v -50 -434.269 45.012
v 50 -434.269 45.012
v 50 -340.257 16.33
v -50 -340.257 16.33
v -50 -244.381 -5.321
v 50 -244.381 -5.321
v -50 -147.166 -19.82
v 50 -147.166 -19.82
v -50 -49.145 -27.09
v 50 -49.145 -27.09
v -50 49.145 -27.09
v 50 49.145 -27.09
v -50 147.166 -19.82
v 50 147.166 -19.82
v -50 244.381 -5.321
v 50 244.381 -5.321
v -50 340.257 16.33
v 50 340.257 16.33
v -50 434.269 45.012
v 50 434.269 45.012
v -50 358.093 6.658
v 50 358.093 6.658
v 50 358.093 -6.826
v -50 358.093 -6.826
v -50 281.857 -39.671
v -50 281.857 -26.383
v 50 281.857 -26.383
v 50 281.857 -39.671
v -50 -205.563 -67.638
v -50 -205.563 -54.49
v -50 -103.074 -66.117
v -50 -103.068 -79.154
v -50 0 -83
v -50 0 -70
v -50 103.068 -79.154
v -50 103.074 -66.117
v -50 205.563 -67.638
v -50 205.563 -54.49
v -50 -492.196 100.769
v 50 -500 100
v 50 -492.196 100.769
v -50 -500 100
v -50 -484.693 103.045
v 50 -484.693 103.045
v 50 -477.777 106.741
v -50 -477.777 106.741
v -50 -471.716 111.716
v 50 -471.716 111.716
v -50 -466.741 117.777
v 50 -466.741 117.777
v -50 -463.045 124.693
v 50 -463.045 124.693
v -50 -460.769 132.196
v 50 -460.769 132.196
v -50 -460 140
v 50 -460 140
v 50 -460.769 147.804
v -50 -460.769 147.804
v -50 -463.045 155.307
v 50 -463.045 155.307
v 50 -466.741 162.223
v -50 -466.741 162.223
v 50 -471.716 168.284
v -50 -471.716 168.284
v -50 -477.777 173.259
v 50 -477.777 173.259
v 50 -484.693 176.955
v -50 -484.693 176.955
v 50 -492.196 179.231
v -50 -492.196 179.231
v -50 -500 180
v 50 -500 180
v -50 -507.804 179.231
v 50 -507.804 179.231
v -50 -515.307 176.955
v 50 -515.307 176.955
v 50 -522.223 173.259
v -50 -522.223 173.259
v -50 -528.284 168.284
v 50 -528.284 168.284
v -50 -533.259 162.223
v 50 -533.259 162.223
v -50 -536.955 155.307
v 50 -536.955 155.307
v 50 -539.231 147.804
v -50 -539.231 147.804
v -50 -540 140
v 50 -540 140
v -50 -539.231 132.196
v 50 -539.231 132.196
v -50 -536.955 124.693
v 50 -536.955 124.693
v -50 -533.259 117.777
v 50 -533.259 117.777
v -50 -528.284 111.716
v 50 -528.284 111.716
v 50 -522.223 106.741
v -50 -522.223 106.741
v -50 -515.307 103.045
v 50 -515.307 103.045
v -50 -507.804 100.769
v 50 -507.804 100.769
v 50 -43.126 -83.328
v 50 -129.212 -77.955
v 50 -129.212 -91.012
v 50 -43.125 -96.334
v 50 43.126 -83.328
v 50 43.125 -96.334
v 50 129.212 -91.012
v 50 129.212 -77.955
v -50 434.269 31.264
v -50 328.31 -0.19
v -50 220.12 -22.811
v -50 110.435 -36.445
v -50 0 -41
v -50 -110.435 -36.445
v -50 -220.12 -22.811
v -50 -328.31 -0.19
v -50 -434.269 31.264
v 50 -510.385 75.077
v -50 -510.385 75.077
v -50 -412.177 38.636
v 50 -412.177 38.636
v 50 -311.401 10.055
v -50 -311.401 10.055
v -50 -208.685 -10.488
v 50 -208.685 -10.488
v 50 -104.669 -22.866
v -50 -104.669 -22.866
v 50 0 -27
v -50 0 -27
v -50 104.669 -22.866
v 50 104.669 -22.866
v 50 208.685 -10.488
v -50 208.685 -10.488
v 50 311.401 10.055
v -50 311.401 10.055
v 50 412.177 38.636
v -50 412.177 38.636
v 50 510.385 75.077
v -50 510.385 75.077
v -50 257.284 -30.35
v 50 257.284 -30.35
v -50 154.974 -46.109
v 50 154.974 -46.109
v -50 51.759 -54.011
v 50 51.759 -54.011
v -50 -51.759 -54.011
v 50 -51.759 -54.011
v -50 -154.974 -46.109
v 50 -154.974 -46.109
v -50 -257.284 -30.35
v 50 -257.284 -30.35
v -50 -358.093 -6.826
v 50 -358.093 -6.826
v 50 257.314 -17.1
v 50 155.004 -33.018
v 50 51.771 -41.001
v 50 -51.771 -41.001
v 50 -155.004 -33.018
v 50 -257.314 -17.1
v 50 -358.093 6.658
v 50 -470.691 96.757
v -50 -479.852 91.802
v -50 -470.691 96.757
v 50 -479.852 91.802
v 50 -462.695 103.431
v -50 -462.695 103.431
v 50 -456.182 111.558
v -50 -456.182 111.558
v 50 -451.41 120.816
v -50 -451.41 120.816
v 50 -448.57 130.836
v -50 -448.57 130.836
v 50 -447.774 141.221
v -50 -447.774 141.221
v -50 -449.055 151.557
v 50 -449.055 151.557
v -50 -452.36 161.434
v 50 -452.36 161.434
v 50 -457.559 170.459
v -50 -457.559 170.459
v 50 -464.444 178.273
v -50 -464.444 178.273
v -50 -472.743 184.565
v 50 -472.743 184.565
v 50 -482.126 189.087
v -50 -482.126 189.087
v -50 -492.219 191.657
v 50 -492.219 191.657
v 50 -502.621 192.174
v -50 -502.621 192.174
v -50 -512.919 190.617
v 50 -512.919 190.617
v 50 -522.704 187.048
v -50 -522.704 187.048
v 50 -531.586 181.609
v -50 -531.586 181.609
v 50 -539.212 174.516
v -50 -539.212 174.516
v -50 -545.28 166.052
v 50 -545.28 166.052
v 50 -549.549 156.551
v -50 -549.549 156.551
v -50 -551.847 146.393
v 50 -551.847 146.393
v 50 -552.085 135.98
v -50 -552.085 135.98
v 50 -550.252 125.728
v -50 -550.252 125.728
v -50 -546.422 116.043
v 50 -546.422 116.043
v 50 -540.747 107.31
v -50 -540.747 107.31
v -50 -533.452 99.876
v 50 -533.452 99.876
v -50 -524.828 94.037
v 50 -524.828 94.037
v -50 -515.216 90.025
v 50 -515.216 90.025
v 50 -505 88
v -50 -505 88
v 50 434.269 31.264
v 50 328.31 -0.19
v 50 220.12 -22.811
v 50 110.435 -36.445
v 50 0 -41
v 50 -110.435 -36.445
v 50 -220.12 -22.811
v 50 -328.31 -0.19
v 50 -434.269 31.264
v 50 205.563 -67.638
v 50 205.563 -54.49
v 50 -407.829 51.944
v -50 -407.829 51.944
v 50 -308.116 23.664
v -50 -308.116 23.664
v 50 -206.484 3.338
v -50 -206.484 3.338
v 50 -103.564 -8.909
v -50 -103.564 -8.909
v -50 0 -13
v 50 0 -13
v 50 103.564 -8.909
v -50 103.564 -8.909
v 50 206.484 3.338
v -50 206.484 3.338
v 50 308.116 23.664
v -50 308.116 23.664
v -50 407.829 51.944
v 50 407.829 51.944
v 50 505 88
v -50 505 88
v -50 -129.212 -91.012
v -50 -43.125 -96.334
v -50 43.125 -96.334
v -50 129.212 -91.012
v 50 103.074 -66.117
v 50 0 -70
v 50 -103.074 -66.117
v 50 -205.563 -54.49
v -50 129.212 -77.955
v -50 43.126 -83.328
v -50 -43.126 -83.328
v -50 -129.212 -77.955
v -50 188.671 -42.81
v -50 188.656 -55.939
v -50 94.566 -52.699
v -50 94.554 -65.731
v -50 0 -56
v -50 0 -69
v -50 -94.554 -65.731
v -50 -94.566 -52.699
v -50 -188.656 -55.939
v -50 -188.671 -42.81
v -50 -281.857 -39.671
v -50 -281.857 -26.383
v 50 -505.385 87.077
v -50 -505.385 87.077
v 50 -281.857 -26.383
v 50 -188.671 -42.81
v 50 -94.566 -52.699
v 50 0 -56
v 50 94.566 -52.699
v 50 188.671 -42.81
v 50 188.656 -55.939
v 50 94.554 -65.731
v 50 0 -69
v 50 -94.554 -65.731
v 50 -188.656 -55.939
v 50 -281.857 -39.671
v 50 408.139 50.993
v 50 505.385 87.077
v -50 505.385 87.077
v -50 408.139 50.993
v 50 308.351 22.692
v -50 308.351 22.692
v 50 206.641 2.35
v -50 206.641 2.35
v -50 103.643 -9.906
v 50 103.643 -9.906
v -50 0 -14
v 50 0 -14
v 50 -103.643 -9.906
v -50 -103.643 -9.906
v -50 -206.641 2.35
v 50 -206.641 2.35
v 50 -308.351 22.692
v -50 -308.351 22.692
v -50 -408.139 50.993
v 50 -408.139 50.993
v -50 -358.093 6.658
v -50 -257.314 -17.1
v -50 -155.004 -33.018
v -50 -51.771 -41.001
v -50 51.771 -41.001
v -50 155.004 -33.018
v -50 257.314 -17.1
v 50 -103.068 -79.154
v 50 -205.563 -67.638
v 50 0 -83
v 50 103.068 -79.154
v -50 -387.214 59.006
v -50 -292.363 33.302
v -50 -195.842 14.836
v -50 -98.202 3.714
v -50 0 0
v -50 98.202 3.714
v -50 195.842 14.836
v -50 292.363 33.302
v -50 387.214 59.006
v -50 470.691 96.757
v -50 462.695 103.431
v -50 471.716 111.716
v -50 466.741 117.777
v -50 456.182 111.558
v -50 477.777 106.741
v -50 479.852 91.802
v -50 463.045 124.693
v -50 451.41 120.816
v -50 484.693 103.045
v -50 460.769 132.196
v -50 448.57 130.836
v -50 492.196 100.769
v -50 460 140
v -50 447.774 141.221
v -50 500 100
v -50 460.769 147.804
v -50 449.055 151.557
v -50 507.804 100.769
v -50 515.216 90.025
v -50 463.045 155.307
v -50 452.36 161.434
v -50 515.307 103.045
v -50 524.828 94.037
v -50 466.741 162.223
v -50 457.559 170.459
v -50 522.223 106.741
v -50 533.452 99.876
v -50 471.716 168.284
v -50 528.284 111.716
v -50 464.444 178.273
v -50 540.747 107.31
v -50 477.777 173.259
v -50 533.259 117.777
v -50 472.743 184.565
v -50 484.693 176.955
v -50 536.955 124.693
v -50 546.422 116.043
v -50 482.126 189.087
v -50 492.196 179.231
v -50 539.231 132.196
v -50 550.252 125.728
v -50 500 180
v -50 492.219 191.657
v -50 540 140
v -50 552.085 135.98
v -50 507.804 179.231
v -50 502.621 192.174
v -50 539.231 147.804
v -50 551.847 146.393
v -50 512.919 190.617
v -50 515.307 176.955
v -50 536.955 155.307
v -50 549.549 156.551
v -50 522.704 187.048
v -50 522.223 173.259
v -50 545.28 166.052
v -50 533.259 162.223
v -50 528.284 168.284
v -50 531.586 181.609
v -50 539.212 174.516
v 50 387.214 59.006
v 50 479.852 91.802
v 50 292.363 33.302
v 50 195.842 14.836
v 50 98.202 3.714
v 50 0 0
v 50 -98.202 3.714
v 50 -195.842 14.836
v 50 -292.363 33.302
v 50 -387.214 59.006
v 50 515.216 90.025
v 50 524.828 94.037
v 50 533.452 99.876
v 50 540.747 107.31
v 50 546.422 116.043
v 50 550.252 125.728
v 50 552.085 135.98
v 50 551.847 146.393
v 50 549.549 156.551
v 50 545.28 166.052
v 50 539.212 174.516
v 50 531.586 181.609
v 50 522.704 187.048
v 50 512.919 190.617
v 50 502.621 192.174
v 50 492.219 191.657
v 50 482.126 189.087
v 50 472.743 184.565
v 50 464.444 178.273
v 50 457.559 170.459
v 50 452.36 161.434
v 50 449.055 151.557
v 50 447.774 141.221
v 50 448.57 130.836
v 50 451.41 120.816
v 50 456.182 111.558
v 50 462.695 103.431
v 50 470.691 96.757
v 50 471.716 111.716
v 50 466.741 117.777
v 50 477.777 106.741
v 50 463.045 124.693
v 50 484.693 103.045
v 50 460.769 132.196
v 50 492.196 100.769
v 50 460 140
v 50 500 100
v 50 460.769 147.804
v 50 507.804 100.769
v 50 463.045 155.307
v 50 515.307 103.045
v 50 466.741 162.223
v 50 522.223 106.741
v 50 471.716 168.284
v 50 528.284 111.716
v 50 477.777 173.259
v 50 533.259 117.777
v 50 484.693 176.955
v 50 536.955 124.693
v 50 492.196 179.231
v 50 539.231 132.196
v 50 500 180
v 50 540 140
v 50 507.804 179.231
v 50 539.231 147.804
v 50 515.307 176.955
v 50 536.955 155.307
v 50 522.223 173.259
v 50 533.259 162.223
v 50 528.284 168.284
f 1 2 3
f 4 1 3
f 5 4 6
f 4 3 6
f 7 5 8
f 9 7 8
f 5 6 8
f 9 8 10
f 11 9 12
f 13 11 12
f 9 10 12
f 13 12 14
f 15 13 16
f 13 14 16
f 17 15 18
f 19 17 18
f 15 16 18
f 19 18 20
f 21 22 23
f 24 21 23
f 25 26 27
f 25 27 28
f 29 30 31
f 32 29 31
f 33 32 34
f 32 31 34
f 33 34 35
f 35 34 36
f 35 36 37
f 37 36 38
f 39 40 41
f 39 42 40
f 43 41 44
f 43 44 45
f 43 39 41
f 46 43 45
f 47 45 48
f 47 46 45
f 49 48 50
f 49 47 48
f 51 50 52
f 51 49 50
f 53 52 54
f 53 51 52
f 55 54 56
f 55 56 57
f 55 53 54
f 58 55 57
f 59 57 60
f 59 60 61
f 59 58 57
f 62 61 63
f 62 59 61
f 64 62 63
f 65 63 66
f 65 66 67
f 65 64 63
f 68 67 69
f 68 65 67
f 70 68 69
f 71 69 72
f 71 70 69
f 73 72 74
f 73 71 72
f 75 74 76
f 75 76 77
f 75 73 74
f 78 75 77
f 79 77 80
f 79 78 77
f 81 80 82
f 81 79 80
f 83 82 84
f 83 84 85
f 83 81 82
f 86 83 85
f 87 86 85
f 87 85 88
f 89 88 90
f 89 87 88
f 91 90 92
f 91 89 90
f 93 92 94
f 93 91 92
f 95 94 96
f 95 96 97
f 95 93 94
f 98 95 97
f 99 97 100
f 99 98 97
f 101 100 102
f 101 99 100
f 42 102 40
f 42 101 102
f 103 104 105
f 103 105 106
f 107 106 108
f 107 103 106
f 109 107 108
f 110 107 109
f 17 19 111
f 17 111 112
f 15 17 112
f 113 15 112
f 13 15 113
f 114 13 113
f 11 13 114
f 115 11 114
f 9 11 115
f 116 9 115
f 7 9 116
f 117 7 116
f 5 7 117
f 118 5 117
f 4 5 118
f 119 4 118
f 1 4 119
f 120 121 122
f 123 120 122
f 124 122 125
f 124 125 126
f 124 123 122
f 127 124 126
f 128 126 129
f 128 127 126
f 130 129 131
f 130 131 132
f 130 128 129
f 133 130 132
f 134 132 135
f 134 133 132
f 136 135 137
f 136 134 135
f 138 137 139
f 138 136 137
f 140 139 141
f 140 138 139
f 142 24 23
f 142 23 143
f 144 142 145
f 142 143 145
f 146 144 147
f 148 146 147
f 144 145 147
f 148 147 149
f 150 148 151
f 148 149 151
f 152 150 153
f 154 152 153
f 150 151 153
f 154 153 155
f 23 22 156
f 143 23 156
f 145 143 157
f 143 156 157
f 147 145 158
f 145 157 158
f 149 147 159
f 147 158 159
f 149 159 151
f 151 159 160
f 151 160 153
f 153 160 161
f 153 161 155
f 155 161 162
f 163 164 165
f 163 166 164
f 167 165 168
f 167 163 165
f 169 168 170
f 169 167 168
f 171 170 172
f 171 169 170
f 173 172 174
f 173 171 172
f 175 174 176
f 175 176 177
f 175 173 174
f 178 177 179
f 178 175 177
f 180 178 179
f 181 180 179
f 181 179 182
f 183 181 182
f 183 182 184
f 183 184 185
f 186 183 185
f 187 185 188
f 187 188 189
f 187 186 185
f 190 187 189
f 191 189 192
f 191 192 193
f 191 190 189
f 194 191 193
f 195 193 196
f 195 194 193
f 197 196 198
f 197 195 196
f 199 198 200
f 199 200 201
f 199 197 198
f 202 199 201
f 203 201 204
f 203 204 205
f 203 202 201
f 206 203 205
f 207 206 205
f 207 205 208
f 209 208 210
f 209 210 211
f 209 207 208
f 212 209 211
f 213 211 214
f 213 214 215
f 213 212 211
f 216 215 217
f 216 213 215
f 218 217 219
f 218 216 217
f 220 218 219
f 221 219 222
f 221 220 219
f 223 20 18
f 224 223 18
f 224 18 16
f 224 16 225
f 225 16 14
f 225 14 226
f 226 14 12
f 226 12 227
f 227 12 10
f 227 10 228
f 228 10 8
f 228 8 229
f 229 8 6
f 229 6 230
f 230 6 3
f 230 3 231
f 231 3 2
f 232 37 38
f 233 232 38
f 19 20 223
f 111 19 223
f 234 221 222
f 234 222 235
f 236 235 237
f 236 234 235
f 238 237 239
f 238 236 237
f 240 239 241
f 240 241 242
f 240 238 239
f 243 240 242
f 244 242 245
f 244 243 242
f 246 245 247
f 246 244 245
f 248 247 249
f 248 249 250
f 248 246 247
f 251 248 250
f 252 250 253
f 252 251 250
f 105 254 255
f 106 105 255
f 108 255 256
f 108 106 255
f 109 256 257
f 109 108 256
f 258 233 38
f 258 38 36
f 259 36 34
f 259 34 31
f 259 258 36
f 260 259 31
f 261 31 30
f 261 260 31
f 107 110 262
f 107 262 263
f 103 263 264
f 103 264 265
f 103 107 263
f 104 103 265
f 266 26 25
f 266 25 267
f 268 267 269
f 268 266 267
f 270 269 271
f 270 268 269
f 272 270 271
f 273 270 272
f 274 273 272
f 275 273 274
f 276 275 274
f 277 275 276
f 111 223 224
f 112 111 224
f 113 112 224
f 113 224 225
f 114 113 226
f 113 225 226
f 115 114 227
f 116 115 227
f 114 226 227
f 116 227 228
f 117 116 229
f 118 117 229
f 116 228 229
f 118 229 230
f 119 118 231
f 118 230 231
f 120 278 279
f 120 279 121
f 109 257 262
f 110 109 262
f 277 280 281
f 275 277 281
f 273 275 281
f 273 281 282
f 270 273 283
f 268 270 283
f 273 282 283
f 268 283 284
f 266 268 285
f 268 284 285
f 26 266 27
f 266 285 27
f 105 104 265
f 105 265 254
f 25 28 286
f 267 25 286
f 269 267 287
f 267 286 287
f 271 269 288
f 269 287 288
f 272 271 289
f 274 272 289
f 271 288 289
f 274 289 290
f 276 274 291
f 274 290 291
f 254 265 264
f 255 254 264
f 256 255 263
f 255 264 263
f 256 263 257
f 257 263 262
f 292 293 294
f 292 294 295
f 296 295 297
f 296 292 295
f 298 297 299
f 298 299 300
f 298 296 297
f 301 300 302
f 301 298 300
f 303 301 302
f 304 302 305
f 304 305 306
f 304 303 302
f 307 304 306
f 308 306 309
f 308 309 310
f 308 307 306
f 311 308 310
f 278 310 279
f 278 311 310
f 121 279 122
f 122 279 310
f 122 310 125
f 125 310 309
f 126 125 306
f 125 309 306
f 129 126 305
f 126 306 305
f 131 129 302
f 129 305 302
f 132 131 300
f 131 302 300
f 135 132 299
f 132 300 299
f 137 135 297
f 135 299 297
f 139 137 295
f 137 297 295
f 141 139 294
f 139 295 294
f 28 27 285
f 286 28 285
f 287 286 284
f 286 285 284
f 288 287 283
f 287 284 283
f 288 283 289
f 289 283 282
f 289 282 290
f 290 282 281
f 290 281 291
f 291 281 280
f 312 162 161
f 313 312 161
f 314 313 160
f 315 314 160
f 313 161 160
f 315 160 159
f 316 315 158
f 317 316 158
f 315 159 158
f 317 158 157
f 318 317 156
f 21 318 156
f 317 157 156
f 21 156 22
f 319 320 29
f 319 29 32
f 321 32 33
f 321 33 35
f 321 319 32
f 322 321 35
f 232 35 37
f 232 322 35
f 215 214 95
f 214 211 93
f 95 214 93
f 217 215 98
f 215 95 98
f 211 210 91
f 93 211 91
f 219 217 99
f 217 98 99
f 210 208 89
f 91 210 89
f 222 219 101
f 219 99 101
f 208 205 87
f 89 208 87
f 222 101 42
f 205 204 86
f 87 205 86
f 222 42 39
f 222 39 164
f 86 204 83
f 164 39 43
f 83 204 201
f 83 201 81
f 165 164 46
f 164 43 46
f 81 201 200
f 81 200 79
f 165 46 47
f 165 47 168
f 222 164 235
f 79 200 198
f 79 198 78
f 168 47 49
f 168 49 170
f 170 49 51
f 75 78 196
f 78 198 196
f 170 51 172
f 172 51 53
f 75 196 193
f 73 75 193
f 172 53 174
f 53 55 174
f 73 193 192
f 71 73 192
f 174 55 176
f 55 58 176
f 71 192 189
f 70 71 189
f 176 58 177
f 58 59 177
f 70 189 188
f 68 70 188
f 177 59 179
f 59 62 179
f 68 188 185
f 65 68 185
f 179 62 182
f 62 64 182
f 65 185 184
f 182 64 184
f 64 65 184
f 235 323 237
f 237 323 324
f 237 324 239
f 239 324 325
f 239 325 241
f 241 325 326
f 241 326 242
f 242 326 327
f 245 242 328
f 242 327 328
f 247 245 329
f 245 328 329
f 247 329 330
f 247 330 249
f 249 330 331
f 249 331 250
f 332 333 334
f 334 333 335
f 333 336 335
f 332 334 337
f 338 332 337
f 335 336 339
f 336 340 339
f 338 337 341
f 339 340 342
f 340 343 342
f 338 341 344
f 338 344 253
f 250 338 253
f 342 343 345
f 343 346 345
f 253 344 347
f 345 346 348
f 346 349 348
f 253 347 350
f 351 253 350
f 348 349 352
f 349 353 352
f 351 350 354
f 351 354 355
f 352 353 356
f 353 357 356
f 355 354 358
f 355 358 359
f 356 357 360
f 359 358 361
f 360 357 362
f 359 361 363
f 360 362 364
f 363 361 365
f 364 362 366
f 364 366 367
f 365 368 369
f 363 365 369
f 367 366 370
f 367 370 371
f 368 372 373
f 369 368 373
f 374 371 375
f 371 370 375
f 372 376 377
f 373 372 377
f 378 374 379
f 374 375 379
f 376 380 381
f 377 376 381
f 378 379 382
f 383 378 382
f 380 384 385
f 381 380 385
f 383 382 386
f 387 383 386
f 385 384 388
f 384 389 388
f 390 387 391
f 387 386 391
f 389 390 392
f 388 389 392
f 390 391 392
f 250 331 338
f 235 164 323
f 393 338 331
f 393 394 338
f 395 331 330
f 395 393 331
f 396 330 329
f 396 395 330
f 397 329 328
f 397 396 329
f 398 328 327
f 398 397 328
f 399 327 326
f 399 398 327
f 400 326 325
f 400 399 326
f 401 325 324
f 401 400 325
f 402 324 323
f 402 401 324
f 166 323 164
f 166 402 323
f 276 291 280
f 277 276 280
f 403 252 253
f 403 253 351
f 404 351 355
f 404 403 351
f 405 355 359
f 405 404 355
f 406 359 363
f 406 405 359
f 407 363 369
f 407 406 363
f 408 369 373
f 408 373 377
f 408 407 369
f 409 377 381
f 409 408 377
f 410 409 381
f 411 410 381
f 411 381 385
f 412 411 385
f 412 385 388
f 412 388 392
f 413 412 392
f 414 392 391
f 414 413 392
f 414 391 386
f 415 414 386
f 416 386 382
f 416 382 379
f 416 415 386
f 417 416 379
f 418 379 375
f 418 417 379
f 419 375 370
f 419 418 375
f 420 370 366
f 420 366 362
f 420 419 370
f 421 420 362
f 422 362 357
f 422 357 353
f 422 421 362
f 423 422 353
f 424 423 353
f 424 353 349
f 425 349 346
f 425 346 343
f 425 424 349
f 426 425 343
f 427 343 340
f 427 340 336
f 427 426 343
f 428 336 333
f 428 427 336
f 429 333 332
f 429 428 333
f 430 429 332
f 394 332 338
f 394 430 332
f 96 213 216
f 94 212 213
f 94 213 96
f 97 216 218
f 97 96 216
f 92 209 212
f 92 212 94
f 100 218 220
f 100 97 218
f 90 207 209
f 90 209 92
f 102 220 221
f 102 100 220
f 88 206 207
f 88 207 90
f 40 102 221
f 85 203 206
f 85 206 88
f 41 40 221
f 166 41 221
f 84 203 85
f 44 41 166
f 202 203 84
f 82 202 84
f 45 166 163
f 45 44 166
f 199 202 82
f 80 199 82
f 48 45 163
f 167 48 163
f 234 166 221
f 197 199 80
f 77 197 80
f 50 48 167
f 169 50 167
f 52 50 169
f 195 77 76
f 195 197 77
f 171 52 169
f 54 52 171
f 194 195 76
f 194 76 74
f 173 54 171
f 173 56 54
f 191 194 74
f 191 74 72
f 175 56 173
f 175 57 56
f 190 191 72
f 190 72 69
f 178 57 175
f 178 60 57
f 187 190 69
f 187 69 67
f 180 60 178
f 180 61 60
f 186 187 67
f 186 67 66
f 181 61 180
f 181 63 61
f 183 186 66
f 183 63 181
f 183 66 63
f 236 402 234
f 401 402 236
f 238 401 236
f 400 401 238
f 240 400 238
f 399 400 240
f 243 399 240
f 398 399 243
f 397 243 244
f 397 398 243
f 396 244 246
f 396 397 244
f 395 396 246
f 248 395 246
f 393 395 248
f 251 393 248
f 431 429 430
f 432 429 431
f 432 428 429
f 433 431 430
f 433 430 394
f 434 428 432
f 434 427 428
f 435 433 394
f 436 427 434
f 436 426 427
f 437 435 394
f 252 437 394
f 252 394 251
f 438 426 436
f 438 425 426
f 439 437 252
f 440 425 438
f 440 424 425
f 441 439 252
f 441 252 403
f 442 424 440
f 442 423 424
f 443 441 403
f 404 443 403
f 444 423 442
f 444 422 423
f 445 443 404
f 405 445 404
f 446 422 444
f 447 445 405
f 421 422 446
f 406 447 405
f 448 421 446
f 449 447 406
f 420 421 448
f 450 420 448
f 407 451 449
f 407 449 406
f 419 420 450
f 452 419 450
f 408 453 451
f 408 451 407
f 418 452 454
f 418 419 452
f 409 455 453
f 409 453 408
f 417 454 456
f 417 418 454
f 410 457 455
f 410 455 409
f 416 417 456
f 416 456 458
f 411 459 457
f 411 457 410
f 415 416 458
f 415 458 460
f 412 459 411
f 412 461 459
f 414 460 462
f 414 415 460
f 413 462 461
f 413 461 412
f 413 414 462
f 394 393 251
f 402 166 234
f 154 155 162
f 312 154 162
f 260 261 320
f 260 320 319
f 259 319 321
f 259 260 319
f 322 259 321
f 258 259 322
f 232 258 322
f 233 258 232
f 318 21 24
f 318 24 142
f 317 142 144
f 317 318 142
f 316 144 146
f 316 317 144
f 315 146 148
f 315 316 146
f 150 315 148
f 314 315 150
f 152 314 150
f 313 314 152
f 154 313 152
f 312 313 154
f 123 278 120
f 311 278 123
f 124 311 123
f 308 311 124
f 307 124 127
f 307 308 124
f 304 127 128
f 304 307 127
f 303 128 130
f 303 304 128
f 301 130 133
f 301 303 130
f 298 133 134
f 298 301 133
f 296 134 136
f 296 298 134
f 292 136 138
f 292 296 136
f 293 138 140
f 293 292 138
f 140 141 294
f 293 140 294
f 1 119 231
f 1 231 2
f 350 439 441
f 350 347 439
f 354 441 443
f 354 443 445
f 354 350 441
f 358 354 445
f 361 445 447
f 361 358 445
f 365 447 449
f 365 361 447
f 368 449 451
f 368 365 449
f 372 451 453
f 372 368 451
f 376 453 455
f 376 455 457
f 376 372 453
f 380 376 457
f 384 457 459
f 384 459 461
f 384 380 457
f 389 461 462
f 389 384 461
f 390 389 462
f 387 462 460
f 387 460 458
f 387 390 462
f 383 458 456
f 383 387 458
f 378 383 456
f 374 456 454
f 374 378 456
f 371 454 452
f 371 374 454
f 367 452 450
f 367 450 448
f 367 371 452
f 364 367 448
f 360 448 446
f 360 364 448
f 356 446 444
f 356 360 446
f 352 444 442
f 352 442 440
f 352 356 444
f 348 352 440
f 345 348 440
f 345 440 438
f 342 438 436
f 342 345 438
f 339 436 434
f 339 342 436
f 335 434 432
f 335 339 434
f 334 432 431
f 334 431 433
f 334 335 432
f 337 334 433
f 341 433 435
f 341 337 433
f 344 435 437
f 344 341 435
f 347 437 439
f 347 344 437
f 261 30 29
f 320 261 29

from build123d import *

# Parameters (mm, degrees)
SKETCH1_R           = 40
BOSS_EXTRUDE1_DEPTH = 50
BOSS_EXTRUDE2_DEPTH = 100
BOSS_EXTRUDE3_DEPTH = 100
BOSS_EXTRUDE4_DEPTH = 100
BOSS_EXTRUDE5_DEPTH = 100
BOSS_EXTRUDE6_DEPTH = 100
BOSS_EXTRUDE7_DEPTH = 100


with BuildPart() as part:
    # Sketch1 → Boss-Extrude1 (new, symmetric)
    with BuildSketch(Plane.YZ):
        with BuildLine():
            ThreePointArc((-479.851684164, 91.802019036), (-507.809078393, 191.652863373), (-505, 88))
            ThreePointArc((-505, 88), (0, -13), (505, 88))
            ThreePointArc((505, 88), (507.809078393, 191.652863373), (479.851684164, 91.802019036))
            ThreePointArc((479.851684164, 91.802019036), (0, 0), (-479.851684164, 91.802019036))
        make_face()
        with Locations(Location((-500, 140, 0), (0, 0, 270))):
            Circle(SKETCH1_R, mode=Mode.SUBTRACT)
        with Locations(Location((500, 140, 0), (0, 0, 270))):
            Circle(SKETCH1_R, mode=Mode.SUBTRACT)
    extrude(amount=BOSS_EXTRUDE1_DEPTH, both=True)


with BuildPart() as body_2:
    # Sketch2 → Boss-Extrude2 (new body)
    with BuildSketch(Plane.YZ.offset(50)):
        with BuildLine():
            Line((-505.384615385, 87.076923077), (-510.384615385, 75.076923077))
            ThreePointArc((-510.384615385, 75.076923077), (0, -27), (510.384615385, 75.076923077))
            Line((510.384615385, 75.076923077), (505.384615385, 87.076923077))
            ThreePointArc((505.384615385, 87.076923077), (0, -14), (-505.384615385, 87.076923077))
        make_face()
    extrude(amount=-BOSS_EXTRUDE2_DEPTH)


with BuildPart() as body_3:
    # Sketch3 → Boss-Extrude3 (new body)
    with BuildSketch(Plane.YZ.offset(50)):
        with BuildLine():
            Line((434.269230769, 45.012256949), (434.269230769, 31.263922162))
            ThreePointArc((434.269230769, 31.263922162), (0, -41), (-434.269230769, 31.263922162))
            Line((-434.269230769, 31.263922162), (-434.269230769, 45.012256949))
            ThreePointArc((-434.269230769, 45.012256949), (0, -28), (434.269230769, 45.012256949))
        make_face()
    extrude(amount=-BOSS_EXTRUDE3_DEPTH)


with BuildPart() as body_4:
    # Sketch4 → Boss-Extrude4 (new body)
    with BuildSketch(Plane.YZ.offset(50)):
        with BuildLine():
            Line((-358.093070613, -6.826060644), (-358.093070613, 6.658068112))
            ThreePointArc((-358.093070613, 6.658068112), (0, -42), (358.093070613, 6.658068112))
            Line((358.093070613, 6.658068112), (358.093070613, -6.826060644))
            ThreePointArc((358.093070613, -6.826060644), (0, -55), (-358.093070613, -6.826060644))
        make_face()
    extrude(amount=-BOSS_EXTRUDE4_DEPTH)


with BuildPart() as body_5:
    # Sketch5 → Boss-Extrude5 (new body)
    with BuildSketch(Plane.YZ.offset(50)):
        with BuildLine():
            Line((-281.857345942, -39.6706448), (-281.857345942, -26.383216321))
            ThreePointArc((-281.857345942, -26.383216321), (0, -56), (281.857345942, -26.383216321))
            Line((281.857345942, -26.383216321), (281.857345942, -39.6706448))
            ThreePointArc((281.857345942, -39.6706448), (0, -69), (-281.857345942, -39.6706448))
        make_face()
    extrude(amount=-BOSS_EXTRUDE5_DEPTH)


with BuildPart() as body_6:
    # Sketch6 → Boss-Extrude6 (new body)
    with BuildSketch(Plane.YZ.offset(50)):
        with BuildLine():
            Line((-205.563231513, -54.490220655), (-205.563231513, -67.637655905))
            ThreePointArc((-205.563231513, -67.637655905), (0, -83), (205.563231513, -67.637655905))
            Line((205.563231513, -67.637655905), (205.563231513, -54.490220655))
            ThreePointArc((205.563231513, -54.490220655), (0, -70), (-205.563231513, -54.490220655))
        make_face()
    extrude(amount=-BOSS_EXTRUDE6_DEPTH)


with BuildPart() as body_7:
    # Sketch7 → Boss-Extrude7 (new body)
    with BuildSketch(Plane.YZ.offset(50)):
        with BuildLine():
            Line((-129.211867255, -77.95511297), (-129.211867255, -91.011607917))
            ThreePointArc((-129.211867255, -91.011607917), (0, -97), (129.211867255, -91.011607917))
            Line((129.211867255, -91.011607917), (129.211867255, -77.95511297))
            ThreePointArc((129.211867255, -77.95511297), (0, -84), (-129.211867255, -77.95511297))
        make_face()
    extrude(amount=-BOSS_EXTRUDE7_DEPTH)


solid = Compound([part.part, body_2.part, body_3.part, body_4.part, body_5.part, body_6.part, body_7.part])
